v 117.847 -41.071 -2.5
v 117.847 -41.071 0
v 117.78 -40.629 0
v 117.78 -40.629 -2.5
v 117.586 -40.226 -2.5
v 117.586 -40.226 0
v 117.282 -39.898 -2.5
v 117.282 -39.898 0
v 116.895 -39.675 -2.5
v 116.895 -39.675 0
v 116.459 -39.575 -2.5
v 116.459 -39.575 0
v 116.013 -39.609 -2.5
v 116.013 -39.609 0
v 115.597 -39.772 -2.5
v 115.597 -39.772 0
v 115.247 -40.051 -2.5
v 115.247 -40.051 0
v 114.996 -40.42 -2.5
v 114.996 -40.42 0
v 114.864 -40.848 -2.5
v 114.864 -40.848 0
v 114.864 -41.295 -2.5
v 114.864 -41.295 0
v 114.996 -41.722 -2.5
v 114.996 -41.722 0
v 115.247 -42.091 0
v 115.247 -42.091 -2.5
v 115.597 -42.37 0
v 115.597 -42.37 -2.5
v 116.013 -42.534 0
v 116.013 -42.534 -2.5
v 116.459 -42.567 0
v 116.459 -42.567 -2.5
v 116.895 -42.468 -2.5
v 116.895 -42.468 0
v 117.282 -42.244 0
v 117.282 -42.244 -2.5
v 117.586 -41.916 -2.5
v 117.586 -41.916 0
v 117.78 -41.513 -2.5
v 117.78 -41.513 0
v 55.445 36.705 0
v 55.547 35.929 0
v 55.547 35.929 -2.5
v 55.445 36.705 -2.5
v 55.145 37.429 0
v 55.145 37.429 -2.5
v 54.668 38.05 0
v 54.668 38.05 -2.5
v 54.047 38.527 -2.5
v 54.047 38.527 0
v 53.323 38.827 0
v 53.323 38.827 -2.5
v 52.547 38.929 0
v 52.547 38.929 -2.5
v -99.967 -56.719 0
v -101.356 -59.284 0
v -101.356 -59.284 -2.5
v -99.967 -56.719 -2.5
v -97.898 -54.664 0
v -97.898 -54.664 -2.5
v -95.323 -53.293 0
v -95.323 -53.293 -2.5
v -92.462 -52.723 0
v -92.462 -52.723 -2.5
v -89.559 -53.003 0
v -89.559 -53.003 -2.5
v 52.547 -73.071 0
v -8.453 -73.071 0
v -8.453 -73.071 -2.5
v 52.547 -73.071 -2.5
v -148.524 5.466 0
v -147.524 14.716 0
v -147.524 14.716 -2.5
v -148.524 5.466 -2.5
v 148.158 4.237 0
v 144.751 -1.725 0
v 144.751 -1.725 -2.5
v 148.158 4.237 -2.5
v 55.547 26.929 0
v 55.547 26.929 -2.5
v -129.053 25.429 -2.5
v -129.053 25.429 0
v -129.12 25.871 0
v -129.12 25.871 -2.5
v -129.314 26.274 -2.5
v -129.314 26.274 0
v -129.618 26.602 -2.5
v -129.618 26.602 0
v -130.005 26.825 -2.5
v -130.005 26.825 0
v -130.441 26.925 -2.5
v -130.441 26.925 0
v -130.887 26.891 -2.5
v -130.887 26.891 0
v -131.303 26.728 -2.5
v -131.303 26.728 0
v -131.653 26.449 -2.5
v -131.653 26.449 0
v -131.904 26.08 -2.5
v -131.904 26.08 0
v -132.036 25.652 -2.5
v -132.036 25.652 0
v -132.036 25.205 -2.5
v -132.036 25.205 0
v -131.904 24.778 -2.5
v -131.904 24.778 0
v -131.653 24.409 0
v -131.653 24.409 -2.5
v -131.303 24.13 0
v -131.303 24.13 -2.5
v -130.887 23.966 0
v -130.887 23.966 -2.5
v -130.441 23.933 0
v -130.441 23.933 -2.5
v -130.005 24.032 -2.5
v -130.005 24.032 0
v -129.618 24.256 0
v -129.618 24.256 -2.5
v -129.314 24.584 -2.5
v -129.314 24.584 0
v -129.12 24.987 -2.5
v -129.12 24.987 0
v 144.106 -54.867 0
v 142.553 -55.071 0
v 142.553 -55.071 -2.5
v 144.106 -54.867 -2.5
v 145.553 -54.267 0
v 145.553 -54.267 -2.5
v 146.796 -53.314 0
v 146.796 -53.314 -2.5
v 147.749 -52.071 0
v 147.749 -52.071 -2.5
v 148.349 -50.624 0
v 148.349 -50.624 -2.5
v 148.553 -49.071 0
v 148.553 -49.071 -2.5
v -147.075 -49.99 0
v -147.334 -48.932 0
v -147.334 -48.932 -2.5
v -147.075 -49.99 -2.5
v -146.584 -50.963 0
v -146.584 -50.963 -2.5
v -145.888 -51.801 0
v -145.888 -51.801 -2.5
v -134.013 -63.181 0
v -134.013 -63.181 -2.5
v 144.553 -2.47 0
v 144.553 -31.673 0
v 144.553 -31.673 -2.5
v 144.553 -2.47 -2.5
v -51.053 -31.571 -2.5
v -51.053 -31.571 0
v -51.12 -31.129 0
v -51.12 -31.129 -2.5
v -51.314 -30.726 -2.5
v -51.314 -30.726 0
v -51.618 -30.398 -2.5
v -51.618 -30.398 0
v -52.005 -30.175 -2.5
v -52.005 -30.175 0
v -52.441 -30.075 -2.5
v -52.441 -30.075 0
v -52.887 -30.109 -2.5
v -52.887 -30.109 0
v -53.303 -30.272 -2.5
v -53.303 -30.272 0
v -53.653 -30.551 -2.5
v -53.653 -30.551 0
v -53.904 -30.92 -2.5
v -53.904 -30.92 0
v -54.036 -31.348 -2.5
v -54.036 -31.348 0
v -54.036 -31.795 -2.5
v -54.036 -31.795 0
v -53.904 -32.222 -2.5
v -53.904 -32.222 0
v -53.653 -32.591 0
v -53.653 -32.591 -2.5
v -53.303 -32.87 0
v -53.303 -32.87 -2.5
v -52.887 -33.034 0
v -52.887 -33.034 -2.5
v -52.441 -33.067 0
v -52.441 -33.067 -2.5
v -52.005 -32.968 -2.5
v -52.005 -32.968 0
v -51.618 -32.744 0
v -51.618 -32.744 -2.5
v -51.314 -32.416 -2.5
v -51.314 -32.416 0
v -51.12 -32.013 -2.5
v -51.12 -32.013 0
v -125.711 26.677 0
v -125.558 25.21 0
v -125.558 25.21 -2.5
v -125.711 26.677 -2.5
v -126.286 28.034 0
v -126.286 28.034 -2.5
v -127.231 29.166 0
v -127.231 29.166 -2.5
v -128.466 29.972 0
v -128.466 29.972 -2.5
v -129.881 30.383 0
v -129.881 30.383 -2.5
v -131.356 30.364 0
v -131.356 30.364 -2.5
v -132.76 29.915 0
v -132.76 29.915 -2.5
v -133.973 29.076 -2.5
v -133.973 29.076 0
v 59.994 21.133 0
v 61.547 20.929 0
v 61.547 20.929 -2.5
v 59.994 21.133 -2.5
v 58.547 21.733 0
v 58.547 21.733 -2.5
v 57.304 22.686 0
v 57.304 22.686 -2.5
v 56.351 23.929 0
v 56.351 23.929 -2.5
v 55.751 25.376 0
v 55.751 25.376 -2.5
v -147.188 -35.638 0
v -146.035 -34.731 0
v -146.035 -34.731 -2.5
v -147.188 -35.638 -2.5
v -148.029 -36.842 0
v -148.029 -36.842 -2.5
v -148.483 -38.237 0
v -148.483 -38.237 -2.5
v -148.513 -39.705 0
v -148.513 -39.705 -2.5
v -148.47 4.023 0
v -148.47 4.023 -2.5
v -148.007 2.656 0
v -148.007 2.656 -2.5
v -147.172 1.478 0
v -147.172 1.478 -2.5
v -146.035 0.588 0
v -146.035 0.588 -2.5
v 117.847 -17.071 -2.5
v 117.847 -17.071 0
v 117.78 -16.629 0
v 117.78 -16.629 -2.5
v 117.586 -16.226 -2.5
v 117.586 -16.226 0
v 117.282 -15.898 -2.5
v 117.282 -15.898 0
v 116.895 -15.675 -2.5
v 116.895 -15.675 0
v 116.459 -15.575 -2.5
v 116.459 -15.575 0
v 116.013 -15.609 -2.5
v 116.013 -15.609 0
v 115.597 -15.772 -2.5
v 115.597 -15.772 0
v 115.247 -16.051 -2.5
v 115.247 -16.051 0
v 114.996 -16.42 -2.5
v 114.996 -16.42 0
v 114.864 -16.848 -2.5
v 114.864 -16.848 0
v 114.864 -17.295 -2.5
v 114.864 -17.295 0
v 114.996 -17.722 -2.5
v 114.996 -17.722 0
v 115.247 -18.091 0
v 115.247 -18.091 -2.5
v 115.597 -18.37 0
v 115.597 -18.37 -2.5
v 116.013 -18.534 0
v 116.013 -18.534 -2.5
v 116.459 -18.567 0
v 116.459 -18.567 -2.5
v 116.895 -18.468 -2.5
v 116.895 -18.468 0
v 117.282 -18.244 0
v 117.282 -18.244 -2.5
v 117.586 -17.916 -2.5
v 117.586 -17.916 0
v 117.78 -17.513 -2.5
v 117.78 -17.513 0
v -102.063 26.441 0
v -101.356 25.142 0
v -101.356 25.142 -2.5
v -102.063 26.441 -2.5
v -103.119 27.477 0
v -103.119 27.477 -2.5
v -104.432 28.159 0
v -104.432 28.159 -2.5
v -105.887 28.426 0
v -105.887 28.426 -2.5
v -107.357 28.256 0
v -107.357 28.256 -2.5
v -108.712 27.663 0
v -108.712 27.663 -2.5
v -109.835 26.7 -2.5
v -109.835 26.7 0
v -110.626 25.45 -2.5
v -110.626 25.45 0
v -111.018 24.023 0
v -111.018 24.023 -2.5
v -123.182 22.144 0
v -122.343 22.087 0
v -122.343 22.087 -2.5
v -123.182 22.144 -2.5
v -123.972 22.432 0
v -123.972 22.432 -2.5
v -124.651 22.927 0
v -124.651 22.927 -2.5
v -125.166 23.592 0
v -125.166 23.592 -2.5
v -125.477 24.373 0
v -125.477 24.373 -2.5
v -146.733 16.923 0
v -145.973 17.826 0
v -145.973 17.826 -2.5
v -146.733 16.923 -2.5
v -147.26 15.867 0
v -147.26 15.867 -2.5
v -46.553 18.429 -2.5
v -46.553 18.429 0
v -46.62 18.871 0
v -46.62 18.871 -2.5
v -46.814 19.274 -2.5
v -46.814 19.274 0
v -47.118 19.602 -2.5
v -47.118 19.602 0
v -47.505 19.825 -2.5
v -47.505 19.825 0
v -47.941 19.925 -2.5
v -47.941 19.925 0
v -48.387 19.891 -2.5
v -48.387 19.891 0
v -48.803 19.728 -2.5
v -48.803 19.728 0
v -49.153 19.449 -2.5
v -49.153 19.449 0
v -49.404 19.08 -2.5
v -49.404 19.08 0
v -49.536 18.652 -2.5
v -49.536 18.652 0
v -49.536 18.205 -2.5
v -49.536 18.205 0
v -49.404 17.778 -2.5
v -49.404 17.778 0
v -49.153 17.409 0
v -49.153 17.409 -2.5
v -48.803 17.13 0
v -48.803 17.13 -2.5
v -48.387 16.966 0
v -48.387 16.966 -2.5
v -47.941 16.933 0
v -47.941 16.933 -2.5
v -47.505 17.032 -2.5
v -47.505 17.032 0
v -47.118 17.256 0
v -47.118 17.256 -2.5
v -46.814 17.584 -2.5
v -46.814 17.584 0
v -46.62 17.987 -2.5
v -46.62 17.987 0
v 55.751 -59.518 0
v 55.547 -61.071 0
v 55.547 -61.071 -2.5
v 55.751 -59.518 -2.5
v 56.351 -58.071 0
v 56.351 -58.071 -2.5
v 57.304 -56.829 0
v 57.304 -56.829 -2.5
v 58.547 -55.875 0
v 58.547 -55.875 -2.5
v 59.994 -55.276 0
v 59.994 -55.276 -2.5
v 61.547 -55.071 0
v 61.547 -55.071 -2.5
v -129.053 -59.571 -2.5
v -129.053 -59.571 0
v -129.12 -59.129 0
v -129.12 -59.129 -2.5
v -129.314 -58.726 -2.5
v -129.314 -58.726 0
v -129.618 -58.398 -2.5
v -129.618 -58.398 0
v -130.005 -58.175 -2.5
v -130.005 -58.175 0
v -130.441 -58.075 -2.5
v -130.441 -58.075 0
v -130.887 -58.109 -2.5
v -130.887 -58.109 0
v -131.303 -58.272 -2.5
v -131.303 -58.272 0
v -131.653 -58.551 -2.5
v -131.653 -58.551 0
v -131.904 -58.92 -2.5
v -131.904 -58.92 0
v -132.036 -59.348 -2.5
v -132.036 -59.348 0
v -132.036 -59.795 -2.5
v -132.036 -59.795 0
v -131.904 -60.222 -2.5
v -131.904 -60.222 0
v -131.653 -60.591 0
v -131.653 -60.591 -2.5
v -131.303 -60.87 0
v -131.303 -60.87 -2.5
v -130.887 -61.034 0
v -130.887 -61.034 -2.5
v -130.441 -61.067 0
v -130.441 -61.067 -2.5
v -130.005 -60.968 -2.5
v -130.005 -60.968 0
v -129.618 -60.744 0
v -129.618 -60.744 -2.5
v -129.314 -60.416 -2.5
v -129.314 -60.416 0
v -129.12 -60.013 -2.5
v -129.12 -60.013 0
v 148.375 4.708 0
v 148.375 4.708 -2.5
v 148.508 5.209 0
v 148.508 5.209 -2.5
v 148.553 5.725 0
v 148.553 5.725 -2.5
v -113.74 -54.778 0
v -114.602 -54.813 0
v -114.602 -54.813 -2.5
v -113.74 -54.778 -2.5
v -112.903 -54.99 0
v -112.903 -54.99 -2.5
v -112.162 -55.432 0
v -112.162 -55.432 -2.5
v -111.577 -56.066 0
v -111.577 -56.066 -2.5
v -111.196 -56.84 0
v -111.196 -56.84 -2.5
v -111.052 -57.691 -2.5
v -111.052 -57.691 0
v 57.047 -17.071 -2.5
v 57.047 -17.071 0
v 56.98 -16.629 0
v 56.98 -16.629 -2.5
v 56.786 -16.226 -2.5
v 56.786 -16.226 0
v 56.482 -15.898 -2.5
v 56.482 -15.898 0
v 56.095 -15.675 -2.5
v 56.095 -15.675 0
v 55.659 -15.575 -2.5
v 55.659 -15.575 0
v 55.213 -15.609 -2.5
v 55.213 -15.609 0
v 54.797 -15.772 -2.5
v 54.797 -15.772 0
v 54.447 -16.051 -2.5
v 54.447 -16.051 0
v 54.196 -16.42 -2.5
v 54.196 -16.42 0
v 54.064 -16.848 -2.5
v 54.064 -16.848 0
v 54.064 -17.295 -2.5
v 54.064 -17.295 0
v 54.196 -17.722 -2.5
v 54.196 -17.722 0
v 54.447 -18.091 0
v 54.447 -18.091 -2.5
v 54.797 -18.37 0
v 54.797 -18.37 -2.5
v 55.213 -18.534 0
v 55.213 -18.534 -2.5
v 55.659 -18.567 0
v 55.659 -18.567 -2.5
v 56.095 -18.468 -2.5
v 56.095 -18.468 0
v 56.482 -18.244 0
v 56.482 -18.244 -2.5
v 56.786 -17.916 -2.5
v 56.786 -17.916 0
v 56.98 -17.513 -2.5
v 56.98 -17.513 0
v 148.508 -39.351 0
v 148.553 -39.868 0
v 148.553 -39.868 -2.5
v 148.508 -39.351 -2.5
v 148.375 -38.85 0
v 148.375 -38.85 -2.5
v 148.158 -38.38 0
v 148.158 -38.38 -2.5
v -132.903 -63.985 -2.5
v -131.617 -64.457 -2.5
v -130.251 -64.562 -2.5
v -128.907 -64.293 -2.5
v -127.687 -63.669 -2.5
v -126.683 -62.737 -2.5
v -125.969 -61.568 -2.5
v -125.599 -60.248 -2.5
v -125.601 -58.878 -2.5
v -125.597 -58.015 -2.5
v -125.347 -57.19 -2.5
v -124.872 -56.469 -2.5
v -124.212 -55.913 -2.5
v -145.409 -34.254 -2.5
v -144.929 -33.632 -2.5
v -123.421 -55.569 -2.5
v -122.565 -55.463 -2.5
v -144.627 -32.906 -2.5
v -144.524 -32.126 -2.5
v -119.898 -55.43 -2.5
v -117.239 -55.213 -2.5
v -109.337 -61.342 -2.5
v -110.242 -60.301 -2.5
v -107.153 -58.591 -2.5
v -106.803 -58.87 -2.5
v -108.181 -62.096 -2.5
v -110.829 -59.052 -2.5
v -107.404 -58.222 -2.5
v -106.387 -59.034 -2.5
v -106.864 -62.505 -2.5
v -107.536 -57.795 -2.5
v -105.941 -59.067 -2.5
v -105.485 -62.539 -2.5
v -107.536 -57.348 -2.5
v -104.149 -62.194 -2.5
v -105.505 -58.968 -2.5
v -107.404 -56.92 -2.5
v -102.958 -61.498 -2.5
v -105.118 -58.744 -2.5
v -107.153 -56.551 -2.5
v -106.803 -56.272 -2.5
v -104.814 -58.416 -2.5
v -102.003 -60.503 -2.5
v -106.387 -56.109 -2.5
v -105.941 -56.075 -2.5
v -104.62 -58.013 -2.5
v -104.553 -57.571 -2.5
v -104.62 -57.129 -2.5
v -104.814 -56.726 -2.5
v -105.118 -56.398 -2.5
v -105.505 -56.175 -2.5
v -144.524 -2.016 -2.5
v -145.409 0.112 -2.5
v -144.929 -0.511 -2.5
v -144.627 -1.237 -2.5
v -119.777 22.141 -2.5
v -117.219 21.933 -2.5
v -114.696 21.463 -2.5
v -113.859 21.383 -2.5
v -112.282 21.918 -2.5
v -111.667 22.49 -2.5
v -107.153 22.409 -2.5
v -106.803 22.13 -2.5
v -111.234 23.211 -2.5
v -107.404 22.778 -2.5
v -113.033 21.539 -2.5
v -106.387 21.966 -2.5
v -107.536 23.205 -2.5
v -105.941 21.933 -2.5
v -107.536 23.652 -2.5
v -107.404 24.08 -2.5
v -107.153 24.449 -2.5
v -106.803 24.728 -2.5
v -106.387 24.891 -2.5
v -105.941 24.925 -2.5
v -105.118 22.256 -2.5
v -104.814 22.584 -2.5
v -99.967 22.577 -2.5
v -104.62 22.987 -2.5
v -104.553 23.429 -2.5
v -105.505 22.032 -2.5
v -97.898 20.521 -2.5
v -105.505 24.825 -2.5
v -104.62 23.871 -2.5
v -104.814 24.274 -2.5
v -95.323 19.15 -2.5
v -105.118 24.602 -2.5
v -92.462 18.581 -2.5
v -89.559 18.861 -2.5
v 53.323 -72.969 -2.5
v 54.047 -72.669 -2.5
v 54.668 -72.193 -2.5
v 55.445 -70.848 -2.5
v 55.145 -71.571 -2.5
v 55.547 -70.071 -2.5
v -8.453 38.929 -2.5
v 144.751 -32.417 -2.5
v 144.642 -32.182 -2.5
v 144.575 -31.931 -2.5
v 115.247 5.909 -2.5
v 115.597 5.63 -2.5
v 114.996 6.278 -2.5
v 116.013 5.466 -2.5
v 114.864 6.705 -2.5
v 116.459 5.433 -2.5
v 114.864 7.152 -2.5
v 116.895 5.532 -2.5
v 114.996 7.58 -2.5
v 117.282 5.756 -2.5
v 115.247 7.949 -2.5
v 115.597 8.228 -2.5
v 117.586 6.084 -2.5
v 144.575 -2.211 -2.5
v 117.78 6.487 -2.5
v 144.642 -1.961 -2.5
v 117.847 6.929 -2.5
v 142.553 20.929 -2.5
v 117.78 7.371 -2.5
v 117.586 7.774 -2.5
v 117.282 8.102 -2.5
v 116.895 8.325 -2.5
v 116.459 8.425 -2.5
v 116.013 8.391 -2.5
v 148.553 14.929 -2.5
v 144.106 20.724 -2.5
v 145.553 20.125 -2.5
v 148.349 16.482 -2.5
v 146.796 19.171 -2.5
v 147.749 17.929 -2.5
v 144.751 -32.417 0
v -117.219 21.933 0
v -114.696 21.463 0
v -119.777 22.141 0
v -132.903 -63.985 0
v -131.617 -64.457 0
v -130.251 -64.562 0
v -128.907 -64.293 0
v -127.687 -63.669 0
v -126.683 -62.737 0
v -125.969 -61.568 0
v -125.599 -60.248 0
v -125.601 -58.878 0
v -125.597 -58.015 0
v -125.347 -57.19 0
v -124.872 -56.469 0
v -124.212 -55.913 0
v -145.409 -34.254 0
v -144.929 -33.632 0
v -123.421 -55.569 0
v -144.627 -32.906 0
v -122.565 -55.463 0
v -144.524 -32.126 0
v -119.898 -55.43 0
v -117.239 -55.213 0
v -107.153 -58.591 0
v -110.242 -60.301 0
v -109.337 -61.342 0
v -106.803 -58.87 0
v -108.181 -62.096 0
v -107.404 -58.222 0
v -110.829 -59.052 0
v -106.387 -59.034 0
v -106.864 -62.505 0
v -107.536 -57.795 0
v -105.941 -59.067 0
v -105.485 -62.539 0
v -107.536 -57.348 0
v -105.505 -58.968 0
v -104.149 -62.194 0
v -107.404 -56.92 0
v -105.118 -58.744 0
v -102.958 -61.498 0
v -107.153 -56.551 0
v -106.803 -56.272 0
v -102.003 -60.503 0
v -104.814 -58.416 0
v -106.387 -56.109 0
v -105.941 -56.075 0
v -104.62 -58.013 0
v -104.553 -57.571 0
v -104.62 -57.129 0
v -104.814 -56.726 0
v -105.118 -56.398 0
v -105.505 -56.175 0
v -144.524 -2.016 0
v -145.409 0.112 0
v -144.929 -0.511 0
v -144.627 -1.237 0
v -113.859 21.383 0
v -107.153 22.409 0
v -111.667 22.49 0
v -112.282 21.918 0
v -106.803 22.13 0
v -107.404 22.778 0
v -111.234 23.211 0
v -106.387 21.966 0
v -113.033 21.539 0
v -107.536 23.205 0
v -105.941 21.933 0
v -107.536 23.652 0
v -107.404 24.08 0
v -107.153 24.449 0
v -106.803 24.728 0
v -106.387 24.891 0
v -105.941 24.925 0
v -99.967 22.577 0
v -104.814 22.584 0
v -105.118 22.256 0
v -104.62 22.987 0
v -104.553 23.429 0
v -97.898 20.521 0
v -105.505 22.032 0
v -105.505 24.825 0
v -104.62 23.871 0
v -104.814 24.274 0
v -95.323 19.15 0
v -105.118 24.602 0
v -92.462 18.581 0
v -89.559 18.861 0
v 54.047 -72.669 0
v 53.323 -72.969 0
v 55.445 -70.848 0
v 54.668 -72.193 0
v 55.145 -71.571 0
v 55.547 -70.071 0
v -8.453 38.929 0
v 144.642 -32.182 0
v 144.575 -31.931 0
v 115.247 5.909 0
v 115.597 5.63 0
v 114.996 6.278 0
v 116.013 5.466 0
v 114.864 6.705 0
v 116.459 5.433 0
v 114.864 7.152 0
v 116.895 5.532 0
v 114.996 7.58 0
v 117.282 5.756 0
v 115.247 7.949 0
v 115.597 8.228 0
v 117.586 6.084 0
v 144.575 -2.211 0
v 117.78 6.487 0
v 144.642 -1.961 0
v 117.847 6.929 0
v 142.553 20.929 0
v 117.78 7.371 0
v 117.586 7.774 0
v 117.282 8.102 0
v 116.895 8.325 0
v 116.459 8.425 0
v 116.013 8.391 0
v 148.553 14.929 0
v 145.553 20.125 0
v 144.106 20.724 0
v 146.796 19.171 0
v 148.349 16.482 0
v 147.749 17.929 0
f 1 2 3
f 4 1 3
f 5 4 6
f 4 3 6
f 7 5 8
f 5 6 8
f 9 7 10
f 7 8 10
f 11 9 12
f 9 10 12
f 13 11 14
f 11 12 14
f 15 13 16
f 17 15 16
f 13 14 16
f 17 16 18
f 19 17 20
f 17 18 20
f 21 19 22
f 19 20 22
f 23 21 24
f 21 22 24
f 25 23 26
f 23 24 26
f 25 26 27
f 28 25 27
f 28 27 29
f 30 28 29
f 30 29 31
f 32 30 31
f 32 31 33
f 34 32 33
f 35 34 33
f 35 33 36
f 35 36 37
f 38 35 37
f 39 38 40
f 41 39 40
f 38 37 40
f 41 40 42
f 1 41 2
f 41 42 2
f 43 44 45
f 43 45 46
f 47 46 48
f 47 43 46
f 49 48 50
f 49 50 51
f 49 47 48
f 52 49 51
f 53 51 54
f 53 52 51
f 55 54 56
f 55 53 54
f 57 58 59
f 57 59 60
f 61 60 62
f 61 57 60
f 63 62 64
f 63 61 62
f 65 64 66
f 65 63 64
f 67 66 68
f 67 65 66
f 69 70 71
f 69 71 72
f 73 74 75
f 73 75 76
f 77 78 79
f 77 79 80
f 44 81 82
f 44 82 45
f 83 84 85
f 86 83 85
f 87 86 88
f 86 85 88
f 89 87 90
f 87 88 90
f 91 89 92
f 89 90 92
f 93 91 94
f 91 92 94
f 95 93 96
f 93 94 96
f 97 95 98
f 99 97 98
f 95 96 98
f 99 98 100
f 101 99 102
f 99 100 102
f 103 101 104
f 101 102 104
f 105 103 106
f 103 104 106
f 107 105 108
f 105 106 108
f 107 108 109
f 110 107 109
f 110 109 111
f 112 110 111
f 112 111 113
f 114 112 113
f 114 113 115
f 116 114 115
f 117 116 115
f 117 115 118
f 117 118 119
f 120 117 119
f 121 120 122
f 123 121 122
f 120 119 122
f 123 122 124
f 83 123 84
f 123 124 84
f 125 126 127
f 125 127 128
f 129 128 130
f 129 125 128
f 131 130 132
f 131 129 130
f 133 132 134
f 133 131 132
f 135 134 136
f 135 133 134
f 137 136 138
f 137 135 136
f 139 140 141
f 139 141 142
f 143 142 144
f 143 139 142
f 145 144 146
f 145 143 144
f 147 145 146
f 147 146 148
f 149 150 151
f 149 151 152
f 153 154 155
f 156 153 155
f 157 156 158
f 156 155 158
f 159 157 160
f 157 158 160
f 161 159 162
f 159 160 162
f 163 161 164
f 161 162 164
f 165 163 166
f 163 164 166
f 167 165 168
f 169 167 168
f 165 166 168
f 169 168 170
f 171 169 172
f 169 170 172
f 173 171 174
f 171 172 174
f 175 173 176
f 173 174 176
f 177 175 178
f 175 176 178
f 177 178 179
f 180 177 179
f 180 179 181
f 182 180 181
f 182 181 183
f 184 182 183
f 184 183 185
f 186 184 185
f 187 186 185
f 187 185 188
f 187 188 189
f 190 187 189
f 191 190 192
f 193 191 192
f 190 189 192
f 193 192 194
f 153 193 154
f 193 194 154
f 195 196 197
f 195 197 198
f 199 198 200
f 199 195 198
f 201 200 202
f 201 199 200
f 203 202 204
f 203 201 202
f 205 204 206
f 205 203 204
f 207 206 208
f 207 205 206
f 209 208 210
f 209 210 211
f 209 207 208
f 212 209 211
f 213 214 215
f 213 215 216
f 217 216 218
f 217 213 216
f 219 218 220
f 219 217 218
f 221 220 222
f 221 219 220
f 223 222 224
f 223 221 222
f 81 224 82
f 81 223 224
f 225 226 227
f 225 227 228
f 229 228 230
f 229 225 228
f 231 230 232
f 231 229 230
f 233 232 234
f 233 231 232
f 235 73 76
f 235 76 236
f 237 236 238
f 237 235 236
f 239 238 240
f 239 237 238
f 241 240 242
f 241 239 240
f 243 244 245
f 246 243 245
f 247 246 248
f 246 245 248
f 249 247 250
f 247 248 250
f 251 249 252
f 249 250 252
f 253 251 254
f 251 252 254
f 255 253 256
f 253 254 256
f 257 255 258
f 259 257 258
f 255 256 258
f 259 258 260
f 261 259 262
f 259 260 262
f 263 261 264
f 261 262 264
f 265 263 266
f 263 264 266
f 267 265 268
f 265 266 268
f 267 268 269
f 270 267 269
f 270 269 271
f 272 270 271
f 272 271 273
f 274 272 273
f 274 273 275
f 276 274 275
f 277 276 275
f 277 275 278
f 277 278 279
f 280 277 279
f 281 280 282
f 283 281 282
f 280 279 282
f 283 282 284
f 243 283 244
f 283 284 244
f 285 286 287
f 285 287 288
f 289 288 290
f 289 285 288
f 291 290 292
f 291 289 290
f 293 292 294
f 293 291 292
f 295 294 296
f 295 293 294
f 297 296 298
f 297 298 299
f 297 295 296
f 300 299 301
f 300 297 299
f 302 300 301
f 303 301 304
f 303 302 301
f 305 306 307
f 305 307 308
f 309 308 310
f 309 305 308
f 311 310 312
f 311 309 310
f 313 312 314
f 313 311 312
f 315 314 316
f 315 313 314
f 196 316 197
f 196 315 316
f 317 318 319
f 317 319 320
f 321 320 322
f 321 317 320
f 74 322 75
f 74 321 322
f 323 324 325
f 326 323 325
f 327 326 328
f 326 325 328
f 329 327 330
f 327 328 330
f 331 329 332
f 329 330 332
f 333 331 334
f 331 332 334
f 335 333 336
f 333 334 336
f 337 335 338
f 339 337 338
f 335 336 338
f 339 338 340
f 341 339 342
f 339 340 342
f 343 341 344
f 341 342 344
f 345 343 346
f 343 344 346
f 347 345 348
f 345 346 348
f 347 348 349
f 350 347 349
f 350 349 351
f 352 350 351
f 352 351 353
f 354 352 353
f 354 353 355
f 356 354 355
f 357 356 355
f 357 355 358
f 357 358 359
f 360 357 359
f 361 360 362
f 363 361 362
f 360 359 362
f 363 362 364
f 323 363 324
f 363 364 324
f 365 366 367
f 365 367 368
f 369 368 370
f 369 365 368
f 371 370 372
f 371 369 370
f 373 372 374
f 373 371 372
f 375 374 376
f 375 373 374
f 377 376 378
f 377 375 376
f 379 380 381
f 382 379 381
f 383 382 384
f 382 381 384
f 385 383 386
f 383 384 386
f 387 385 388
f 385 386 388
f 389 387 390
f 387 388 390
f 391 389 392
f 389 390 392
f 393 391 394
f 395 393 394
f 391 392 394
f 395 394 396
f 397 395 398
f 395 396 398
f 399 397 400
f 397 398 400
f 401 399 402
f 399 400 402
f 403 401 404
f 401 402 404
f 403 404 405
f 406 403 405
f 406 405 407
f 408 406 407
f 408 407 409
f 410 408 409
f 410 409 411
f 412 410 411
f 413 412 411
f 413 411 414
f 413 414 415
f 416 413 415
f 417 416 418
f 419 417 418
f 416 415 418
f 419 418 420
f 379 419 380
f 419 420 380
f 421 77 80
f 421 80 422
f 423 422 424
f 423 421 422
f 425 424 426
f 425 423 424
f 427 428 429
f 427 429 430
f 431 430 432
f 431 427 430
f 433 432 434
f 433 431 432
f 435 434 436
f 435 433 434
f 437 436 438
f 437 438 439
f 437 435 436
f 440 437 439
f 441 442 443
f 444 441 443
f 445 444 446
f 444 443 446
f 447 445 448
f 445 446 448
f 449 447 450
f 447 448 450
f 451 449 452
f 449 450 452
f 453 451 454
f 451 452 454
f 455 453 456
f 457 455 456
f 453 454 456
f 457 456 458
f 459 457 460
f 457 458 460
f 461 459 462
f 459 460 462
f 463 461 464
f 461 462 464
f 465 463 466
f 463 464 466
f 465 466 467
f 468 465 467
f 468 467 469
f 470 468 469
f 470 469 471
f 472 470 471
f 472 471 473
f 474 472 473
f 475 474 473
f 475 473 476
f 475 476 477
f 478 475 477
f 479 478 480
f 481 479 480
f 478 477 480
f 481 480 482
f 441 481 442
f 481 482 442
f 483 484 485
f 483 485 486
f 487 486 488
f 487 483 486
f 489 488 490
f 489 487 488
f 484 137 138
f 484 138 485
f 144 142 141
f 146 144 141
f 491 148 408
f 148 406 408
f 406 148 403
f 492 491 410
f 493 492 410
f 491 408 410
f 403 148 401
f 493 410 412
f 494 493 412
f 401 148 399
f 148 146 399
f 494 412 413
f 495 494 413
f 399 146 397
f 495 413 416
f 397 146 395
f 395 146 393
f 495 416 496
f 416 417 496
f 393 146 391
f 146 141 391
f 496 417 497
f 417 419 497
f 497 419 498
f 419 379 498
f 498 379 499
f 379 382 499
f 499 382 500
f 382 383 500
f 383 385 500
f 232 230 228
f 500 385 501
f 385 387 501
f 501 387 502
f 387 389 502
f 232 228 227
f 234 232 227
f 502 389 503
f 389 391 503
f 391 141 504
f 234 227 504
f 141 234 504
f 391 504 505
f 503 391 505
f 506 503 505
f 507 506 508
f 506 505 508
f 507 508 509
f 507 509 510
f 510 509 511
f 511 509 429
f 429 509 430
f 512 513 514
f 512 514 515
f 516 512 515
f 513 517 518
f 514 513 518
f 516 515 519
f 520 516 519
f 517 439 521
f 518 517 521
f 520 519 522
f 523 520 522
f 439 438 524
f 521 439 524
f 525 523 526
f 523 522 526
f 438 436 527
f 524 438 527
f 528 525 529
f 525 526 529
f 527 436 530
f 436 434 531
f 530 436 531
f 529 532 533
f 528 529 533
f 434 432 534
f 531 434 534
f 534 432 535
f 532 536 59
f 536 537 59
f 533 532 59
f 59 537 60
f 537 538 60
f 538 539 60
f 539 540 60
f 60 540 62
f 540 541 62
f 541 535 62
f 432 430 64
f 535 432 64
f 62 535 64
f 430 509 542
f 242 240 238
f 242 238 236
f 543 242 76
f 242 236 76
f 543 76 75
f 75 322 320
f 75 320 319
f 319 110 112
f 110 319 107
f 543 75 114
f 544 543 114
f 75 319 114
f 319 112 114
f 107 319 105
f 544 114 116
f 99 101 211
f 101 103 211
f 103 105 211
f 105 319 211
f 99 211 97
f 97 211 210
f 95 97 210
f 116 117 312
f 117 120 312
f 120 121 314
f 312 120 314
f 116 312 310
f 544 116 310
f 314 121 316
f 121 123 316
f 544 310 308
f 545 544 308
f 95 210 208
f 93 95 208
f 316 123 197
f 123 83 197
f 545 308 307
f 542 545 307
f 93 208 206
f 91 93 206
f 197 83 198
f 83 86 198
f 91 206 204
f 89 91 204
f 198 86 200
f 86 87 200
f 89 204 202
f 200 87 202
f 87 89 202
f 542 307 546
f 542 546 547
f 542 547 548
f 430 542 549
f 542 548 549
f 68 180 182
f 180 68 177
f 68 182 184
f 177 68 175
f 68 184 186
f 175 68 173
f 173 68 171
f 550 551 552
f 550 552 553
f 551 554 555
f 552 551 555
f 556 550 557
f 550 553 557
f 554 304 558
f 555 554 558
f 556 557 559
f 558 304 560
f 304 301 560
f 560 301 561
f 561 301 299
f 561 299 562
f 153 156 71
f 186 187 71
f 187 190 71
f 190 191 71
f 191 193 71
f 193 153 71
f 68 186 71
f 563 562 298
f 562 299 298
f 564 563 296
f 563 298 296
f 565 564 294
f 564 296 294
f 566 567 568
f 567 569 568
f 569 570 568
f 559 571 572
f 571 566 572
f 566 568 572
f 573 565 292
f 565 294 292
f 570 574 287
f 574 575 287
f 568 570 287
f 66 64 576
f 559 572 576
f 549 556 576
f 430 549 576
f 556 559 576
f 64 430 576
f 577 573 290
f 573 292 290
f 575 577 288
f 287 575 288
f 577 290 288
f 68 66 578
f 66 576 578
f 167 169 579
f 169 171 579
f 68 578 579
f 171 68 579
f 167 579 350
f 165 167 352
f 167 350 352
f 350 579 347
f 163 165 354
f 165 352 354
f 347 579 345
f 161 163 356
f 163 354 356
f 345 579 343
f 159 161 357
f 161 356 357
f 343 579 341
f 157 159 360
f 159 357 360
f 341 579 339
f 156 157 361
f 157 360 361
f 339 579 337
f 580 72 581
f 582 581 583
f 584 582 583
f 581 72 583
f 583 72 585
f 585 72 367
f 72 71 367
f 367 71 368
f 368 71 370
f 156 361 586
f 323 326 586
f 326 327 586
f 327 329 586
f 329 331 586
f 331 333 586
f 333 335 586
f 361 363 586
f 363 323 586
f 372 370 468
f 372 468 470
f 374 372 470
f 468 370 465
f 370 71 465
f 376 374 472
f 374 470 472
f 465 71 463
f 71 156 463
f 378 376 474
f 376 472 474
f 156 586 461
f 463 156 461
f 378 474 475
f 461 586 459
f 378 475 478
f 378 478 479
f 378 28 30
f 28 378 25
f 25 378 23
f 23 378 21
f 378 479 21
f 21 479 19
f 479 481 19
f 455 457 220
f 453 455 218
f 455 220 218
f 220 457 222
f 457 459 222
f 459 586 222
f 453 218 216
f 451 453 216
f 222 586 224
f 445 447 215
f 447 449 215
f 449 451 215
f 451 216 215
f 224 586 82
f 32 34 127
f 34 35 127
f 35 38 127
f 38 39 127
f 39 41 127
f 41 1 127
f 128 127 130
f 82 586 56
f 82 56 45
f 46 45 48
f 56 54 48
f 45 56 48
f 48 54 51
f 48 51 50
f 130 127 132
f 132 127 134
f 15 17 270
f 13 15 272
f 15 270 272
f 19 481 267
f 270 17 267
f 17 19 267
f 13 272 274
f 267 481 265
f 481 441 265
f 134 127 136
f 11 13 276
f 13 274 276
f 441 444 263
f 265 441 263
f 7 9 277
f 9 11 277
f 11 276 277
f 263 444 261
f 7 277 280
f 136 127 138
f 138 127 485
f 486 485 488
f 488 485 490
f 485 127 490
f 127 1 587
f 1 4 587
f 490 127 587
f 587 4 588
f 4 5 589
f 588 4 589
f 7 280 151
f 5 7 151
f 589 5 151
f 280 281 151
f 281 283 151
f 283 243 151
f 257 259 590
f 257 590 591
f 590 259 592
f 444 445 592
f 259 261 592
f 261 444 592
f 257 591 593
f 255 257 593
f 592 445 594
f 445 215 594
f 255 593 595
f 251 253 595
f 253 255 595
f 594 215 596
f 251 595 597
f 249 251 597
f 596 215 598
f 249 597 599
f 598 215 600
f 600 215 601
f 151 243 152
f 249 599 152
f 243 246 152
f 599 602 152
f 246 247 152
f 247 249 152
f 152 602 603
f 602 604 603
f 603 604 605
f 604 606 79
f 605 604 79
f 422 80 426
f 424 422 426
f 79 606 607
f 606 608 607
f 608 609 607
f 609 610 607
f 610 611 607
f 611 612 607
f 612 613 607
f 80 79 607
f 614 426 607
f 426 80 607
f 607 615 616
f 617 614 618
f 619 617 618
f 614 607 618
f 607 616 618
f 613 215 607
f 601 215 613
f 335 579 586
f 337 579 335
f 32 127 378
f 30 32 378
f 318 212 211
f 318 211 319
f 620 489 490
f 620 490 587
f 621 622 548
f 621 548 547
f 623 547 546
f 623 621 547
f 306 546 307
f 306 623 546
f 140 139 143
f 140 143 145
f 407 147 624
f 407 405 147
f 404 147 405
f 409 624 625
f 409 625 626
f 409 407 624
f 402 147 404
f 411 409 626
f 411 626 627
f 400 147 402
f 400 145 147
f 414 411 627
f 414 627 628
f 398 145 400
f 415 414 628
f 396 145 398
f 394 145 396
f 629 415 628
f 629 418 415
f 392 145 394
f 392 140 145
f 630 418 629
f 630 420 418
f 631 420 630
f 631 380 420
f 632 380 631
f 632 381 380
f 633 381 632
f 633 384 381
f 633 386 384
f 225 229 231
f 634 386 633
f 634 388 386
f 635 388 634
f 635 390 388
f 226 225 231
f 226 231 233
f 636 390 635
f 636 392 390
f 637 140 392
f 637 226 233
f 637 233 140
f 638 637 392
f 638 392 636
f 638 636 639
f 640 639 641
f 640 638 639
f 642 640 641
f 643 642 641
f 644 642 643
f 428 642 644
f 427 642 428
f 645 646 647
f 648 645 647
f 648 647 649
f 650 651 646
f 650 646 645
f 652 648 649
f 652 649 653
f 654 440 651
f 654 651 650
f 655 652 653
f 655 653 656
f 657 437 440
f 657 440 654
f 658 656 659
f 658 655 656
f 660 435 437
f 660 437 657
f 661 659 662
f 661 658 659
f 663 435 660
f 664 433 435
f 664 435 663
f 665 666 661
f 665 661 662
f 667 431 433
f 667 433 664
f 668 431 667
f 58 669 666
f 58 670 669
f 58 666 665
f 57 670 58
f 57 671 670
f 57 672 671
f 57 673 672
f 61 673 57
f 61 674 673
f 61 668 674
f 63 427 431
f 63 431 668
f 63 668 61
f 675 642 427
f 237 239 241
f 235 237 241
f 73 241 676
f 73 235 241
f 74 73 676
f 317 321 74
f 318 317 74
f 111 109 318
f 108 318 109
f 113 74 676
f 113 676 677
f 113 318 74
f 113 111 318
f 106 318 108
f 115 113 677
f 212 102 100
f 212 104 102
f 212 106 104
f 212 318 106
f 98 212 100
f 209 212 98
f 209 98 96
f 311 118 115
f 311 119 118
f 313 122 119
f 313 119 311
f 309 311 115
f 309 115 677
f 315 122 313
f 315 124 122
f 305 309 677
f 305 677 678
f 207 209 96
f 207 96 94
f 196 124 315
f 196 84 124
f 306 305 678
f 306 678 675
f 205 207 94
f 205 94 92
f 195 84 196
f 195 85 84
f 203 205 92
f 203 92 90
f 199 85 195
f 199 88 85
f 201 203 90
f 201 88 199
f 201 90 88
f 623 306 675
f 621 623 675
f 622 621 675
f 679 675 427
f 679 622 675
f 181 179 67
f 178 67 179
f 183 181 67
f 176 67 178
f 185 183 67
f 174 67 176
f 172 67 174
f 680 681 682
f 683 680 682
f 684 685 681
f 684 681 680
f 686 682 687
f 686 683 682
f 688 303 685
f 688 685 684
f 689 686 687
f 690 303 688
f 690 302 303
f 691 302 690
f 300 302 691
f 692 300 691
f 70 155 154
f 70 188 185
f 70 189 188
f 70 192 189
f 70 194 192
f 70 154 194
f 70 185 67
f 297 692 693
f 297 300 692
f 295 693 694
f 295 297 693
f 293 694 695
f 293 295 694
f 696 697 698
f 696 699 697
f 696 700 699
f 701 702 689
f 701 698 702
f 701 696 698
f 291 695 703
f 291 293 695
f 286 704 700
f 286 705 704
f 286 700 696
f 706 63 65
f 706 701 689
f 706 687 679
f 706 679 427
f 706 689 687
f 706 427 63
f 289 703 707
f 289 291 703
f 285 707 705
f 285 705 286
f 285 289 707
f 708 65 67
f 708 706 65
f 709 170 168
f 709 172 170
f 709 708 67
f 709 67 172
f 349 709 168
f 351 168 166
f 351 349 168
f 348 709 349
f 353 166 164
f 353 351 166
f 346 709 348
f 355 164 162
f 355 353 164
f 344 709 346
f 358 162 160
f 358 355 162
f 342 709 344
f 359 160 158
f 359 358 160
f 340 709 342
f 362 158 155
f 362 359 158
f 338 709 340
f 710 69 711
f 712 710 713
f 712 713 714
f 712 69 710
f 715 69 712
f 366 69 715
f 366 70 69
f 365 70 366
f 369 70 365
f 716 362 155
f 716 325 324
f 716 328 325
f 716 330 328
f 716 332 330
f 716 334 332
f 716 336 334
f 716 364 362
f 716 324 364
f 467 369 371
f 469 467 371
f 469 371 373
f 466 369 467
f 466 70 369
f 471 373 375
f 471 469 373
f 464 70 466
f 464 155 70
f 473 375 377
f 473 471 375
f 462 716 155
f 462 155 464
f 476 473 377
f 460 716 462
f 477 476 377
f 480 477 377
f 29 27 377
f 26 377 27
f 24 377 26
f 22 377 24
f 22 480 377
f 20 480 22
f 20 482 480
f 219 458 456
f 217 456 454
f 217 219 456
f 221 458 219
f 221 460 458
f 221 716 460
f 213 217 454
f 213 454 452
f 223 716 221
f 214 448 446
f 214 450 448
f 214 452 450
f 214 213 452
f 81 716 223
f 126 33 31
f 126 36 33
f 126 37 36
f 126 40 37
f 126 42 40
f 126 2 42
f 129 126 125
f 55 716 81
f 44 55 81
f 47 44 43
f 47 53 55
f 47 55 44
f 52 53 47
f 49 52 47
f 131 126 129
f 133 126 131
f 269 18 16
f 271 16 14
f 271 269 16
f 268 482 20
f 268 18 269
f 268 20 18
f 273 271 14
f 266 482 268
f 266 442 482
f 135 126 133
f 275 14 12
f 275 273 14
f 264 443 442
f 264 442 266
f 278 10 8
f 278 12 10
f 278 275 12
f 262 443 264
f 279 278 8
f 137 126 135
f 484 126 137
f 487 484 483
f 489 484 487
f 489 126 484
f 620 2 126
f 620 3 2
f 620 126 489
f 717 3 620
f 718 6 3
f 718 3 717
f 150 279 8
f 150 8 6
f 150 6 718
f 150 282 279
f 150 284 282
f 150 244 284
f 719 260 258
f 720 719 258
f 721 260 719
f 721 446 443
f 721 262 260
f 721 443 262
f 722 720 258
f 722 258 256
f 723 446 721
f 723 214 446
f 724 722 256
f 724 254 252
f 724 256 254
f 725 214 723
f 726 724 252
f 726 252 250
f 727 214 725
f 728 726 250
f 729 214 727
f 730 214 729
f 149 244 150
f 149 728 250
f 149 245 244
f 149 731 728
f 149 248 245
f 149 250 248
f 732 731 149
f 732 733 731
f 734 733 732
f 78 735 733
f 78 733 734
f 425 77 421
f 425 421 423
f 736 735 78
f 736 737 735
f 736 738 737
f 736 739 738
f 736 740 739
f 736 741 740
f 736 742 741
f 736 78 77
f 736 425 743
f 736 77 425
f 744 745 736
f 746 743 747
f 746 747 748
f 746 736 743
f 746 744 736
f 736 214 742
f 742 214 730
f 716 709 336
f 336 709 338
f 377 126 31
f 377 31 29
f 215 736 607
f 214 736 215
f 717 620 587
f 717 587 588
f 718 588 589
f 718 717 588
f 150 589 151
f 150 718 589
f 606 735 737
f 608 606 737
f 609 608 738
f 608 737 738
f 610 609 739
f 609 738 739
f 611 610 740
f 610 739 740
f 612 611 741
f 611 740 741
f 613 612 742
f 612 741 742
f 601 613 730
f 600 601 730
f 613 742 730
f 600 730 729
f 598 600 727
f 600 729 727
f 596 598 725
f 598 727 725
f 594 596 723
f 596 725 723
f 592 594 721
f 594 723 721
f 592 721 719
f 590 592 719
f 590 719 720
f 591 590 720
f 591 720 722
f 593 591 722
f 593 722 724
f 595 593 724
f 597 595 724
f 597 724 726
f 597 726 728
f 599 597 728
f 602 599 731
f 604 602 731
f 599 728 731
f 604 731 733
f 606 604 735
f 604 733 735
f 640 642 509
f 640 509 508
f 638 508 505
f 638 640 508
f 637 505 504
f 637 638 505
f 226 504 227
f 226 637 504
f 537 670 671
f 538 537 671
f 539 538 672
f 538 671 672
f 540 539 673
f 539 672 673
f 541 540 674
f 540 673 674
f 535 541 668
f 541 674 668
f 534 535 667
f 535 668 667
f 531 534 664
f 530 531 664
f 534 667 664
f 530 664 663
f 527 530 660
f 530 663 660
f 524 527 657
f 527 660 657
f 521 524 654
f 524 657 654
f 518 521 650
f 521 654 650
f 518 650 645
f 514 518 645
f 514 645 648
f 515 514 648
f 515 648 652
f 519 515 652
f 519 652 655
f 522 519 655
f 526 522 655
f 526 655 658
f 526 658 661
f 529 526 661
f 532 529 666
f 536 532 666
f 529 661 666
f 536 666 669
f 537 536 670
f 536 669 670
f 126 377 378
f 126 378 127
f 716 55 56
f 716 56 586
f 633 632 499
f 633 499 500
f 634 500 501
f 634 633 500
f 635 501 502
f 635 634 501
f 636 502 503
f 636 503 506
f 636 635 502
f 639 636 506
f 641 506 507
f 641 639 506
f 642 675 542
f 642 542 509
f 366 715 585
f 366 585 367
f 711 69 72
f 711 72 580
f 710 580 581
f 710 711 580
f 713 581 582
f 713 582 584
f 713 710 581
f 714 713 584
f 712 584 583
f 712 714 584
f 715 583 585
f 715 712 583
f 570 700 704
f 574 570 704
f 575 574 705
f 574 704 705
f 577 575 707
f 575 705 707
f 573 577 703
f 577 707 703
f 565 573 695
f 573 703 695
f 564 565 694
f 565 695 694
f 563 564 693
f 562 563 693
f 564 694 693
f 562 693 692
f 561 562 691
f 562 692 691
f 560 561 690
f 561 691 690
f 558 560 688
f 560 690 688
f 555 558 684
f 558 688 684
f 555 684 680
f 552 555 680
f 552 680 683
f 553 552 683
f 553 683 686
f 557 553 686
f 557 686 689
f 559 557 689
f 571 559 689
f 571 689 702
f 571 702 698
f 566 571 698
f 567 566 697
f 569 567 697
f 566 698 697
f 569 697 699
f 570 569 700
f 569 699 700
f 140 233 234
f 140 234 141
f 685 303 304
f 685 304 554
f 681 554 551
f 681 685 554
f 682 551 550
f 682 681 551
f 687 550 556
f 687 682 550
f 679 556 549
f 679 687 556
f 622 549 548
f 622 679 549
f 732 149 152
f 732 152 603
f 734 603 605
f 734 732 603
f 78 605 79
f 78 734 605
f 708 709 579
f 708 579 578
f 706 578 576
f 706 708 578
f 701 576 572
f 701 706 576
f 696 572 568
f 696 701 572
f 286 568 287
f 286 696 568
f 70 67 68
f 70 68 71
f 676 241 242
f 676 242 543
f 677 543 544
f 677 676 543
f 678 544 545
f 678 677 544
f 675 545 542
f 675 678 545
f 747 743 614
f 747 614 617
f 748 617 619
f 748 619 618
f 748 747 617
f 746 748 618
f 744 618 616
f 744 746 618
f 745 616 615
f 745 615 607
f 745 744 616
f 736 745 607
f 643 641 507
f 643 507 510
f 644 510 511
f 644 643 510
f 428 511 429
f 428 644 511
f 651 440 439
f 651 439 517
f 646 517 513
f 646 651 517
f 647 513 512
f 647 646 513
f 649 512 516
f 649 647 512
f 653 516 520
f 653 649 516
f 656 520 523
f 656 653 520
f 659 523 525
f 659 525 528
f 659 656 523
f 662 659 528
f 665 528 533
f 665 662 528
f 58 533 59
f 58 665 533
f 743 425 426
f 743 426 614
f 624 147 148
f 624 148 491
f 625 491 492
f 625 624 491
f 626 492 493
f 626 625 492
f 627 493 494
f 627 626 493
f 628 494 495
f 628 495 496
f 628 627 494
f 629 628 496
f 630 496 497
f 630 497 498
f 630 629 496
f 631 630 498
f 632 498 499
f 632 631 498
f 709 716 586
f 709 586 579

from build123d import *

# Parameters (mm, degrees)
F0_R     = 1.5
F1_DEPTH = 2.5


# Not quite as in the source:
# - ends of sketch curves that miss each other by under 0.0002 mm in the source are joined


with BuildPart() as f1:
    # F0 (on Top) → F1 (new body)
    with BuildSketch(Plane.XY):
        with BuildLine():
            ThreePointArc((148.553042, 14.928769), (146.7956826871, 19.1714096871), (142.553042, 20.928769))
            Line((142.553042, 20.928769), (61.546959, 20.928769))
            ThreePointArc((61.546959, 20.928769), (57.3043183129, 22.6861283129), (55.546959, 26.928769))
            Line((55.546959, 26.928769), (55.546959, 35.928769))
            ThreePointArc((55.546959, 35.928769), (54.6682793436, 38.0500893436), (52.546959, 38.928769))
            Line((52.546959, 38.928769), (-8.453041, 38.928769))
            Line((-8.453041, 38.928769), (-89.559124, 18.860903))
            ThreePointArc((-89.559124, 18.860903), (-96.6607350116, 19.7413862614), (-101.3556837465, 25.1419037277))
            ThreePointArc((-101.3556837465, 25.1419037277), (-106.6281165379, 28.3955877128), (-111.0175785103, 24.0232160611))
            ThreePointArc((-111.0175785103, 24.0232160611), (-112.2824719314, 21.9176106757), (-114.6963029885, 21.462694048))
            ThreePointArc((-114.6963029885, 21.462694048), (-118.4956024313, 22.0698924501), (-122.3430789933, 22.0869199077))
            ThreePointArc((-122.3430789933, 22.0869199077), (-124.651171475, 22.9272997317), (-125.557821603, 25.2101739826))
            ThreePointArc((-125.557821603, 25.2101739826), (-128.4655562478, 29.9721606196), (-133.972746844, 29.0764548336))
            Line((-133.972746844, 29.0764548336), (-145.972747, 17.826455))
            ThreePointArc((-145.972747, 17.826455), (-147.027366593, 16.4104523305), (-147.524076258, 14.7161780279))
            Line((-147.524076258, 14.7161780279), (-148.524076, 5.466178))
            ThreePointArc((-148.524076, 5.466178), (-148.0067044123, 2.6561312792), (-146.0349377658, 0.5882404096))
            ThreePointArc((-146.0349377658, 0.5882404096), (-144.929137249, -0.5106558369), (-144.524076, -2.016077))
            Line((-144.524076, -2.016077), (-144.524076, -32.126386))
            ThreePointArc((-144.524076, -32.126386), (-144.929137249, -33.6318071631), (-146.0349379189, -34.7307031419))
            ThreePointArc((-146.0349379189, -34.7307031419), (-148.0285132018, -36.8418479978), (-148.5127305604, -39.7048550716))
            Line((-148.5127305604, -39.7048550716), (-147.333918, -48.932011))
            ThreePointArc((-147.333918, -48.932011), (-146.8569609625, -50.4905877681), (-145.8877919349, -51.801068932))
            Line((-145.8877919349, -51.801068932), (-134.012517, -63.181221))
            ThreePointArc((-134.012517, -63.181221), (-128.2758744449, -64.0225805122), (-125.6012880056, -58.8783080008))
            ThreePointArc((-125.6012880056, -58.8783080008), (-124.8721529677, -56.4691107751), (-122.564742997, -55.4632638637))
            ThreePointArc((-122.564742997, -55.4632638637), (-118.5664827026, -55.3440377294), (-114.6018211423, -54.8132282387))
            ThreePointArc((-114.6018211423, -54.8132282387), (-112.1618303627, -55.4315323166), (-111.051616739, -57.6905760176))
            ThreePointArc((-111.051616739, -57.6905760176), (-106.8640436675, -62.5050200787), (-101.3556836703, -59.2843667555))
            ThreePointArc((-101.3556836703, -59.2843667555), (-96.6607350116, -53.8838492614), (-89.5591238689, -53.0033654703))
            Line((-89.5591238689, -53.0033654703), (-8.453041, -73.071231))
            Line((-8.453041, -73.071231), (52.546959, -73.071231))
            ThreePointArc((52.546959, -73.071231), (54.6682793436, -72.1925513436), (55.546959, -70.071231))
            Line((55.546959, -70.071231), (55.546959, -61.071231))
            ThreePointArc((55.546959, -61.071231), (57.3043183129, -56.8285903129), (61.546959, -55.071231))
            Line((61.546959, -55.071231), (142.553042, -55.071231))
            ThreePointArc((142.553042, -55.071231), (146.7956826871, -53.3138716871), (148.553042, -49.071231))
            Line((148.553042, -49.071231), (148.553042, -39.867925))
            ThreePointArc((148.553042, -39.867925), (148.4525408985, -39.0979210147), (148.1577712418, -38.3795078619))
            Line((148.1577712418, -38.3795078619), (144.750677, -32.417093))
            ThreePointArc((144.750677, -32.417093), (144.6032924632, -32.057886663), (144.553042, -31.672885))
            Line((144.553042, -31.672885), (144.553042, -2.469578))
            ThreePointArc((144.553042, -2.469578), (144.6032924632, -2.084576337), (144.7506770407, -1.7253700232))
            Line((144.7506770407, -1.7253700232), (148.157771, 4.237045))
            ThreePointArc((148.157771, 4.237045), (148.4525408985, 4.9554580147), (148.553042, 5.725462))
            Line((148.553042, 5.725462), (148.553042, 14.928769))
        make_face()
        with Locations((-130.553041, -59.571231)):
            Circle(F0_R, mode=Mode.SUBTRACT)
        with Locations((-106.053041, -57.571231)):
            Circle(F0_R, mode=Mode.SUBTRACT)
        with Locations((-52.553041, -31.571231)):
            Circle(F0_R, mode=Mode.SUBTRACT)
        with Locations((116.346959, -41.071231)):
            Circle(F0_R, mode=Mode.SUBTRACT)
        with Locations((-106.053041, 23.428769)):
            Circle(F0_R, mode=Mode.SUBTRACT)
        with Locations((-130.553041, 25.428769)):
            Circle(F0_R, mode=Mode.SUBTRACT)
        with Locations((-48.053041, 18.428769)):
            Circle(F0_R, mode=Mode.SUBTRACT)
        with Locations((55.546959, -17.071231)):
            Circle(F0_R, mode=Mode.SUBTRACT)
        with Locations((116.346959, -17.071231)):
            Circle(F0_R, mode=Mode.SUBTRACT)
        with Locations((116.346959, 6.928769)):
            Circle(F0_R, mode=Mode.SUBTRACT)
    extrude(amount=-F1_DEPTH)


solid = f1.part
